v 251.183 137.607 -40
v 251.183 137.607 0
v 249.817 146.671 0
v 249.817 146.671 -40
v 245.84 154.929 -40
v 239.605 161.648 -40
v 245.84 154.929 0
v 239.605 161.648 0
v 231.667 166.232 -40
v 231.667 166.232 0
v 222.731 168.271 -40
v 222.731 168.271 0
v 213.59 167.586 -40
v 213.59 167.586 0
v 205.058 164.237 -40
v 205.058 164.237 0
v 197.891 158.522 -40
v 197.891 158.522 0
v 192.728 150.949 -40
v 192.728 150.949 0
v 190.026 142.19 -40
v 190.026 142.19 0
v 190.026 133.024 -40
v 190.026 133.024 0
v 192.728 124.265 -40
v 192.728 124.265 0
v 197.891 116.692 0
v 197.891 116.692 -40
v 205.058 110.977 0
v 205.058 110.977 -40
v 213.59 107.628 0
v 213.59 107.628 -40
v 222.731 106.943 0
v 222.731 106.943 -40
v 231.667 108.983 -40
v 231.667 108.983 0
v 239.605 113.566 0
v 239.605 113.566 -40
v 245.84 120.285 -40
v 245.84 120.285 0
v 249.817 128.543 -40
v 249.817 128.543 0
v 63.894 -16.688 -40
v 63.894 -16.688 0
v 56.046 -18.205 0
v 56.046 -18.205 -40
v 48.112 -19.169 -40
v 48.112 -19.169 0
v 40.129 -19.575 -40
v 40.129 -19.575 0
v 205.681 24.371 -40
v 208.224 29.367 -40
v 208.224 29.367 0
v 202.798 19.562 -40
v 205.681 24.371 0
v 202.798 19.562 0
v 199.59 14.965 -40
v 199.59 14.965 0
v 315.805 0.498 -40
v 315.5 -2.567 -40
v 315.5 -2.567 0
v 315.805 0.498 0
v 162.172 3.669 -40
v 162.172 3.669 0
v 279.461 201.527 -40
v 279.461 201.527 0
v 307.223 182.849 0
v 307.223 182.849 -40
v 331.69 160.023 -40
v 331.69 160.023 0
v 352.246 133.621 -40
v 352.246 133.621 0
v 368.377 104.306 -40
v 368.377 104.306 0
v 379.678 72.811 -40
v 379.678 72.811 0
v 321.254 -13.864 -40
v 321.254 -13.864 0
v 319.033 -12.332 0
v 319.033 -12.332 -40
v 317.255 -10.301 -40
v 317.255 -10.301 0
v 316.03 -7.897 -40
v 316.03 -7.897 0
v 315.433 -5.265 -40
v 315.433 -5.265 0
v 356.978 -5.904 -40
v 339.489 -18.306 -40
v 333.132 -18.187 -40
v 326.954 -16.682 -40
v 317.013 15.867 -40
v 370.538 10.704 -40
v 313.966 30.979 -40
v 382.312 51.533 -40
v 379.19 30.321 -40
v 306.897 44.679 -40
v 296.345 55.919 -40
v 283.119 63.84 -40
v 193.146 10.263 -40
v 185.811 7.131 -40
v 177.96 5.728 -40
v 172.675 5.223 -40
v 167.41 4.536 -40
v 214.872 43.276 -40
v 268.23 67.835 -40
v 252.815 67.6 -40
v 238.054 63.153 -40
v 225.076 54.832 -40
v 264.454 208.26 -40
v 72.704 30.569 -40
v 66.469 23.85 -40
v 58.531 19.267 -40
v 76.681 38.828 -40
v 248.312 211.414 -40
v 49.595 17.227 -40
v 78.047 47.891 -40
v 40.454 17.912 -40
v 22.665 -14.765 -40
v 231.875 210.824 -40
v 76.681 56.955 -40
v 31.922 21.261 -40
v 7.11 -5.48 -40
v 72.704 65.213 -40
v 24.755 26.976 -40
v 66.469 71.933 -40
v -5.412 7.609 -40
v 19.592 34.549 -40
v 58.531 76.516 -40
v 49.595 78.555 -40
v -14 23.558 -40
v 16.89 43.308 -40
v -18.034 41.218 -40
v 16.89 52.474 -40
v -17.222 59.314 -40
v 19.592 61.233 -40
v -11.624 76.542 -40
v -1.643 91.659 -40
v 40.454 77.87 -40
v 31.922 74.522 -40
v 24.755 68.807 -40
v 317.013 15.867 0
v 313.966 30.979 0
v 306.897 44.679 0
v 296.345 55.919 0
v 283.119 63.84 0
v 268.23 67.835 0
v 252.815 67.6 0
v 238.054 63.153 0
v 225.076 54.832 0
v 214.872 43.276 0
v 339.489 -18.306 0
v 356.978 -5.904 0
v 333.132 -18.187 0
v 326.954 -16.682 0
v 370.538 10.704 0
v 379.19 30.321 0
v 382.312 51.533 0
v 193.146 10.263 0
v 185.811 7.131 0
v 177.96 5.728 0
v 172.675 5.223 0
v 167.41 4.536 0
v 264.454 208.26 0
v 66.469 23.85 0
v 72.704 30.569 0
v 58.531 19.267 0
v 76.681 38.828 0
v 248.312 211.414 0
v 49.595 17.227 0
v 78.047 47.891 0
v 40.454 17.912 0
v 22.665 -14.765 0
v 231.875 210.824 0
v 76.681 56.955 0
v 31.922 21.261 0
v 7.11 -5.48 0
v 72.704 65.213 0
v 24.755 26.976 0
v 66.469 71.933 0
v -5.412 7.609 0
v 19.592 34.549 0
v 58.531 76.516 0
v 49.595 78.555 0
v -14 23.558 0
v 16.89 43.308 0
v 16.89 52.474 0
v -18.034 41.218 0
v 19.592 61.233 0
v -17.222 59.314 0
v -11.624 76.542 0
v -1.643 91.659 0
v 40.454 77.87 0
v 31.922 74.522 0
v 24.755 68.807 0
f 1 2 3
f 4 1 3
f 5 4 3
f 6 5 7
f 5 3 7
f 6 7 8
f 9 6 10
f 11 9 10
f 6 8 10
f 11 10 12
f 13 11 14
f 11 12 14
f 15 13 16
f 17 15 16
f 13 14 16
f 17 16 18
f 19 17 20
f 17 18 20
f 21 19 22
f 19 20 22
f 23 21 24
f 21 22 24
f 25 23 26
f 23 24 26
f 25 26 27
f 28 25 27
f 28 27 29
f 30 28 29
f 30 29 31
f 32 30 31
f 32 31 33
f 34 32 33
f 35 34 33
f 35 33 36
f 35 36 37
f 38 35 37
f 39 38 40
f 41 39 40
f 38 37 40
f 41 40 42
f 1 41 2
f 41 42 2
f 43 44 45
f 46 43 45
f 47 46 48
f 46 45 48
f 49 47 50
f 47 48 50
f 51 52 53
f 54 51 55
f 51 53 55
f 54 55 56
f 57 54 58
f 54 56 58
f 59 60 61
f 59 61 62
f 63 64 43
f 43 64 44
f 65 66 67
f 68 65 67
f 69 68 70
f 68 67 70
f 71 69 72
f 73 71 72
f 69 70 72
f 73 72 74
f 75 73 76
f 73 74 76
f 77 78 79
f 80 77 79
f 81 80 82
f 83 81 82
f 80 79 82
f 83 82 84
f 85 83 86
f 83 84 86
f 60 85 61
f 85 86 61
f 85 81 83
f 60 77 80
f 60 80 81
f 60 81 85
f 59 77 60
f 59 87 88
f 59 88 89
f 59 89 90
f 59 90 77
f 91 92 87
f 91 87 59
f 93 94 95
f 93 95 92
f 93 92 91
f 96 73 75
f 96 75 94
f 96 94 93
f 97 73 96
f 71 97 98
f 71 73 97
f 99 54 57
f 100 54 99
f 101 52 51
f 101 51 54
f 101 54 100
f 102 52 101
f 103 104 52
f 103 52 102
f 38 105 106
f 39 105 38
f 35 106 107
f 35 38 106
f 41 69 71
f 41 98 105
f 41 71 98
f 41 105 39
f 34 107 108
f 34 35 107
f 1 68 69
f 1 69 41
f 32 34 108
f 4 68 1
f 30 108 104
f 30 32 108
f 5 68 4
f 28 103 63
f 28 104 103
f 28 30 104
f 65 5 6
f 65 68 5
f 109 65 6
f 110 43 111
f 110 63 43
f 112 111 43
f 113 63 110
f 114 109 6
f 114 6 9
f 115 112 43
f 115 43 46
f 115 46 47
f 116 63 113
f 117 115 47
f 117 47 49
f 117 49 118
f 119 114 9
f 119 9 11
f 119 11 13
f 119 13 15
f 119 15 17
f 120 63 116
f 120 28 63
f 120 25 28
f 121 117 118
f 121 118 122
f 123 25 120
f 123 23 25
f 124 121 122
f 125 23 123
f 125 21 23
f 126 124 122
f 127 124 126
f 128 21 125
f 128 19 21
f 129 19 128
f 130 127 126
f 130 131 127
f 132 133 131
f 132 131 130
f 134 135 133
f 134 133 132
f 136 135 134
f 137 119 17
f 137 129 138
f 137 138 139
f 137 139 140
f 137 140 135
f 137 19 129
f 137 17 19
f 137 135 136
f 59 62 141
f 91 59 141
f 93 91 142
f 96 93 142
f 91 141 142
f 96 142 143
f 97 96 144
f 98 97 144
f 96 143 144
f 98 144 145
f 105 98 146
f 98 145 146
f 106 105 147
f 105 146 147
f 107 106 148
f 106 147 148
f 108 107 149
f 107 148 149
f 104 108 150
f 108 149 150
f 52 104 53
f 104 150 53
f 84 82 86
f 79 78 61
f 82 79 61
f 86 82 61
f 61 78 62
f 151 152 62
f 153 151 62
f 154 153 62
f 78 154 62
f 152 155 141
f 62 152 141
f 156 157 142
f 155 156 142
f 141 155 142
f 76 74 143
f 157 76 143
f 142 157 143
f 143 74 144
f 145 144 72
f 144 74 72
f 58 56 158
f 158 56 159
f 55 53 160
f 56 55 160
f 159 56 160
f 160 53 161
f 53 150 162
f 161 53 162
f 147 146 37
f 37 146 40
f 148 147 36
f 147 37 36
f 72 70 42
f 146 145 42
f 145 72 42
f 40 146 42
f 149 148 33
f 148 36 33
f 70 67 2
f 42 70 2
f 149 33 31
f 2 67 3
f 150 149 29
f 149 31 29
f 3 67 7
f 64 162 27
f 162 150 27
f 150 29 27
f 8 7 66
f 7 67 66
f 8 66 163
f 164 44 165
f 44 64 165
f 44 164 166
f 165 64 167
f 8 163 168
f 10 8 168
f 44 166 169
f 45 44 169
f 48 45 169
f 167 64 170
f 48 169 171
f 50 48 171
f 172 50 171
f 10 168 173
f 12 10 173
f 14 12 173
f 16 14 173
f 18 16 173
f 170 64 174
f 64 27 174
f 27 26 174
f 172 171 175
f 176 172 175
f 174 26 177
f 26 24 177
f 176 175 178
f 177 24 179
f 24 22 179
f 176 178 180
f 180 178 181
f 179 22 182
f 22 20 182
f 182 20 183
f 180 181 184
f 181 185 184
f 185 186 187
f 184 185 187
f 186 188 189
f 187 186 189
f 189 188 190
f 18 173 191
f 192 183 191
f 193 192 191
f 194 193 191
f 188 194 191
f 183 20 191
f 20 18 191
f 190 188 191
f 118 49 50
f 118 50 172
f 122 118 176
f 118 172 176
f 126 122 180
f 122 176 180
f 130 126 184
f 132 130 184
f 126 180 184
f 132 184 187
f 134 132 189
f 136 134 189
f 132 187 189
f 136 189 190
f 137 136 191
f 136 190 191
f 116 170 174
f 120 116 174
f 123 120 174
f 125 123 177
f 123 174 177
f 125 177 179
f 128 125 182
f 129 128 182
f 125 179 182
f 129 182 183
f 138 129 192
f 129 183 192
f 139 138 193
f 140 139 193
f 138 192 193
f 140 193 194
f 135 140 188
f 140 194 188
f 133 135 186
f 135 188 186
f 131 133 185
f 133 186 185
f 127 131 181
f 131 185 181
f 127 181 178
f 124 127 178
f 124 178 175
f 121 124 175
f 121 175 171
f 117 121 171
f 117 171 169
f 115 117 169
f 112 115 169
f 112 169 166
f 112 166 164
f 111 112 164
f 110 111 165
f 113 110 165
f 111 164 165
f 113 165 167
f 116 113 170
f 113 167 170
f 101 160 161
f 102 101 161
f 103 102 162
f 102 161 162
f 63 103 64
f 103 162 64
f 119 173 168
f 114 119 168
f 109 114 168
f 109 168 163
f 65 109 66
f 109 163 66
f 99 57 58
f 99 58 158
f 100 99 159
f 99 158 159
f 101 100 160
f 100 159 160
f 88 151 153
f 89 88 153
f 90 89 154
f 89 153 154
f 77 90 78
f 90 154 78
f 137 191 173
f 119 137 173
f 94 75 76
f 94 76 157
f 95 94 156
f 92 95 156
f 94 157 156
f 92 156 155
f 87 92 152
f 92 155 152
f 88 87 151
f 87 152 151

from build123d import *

# Parameters (mm, degrees)
IZIM1_R            = 30.75
TABAN_FLAN_1_DEPTH = 40


# Sheet-metal steps are written as plain solids
with BuildPart() as part:
    # Çizim1 → Taban-Flanş1 (new body)
    with BuildSketch(Plane.XY):
        with BuildLine():
            Line((-1.643398768, 91.658785331), (231.87468677, 210.823863864))
            ThreePointArc((231.87468677, 210.823863864), (256.473387586, 210.2990154), (279.460662471, 201.526516265))
            ThreePointArc((279.460662471, 201.526516265), (342.491227066, 147.22978074), (379.677674371, 72.810994814))
            ThreePointArc((379.677674371, 72.810994814), (375.525370831, 20.220941214), (339.489037745, -18.306166907))
            ThreePointArc((339.489037745, -18.306166907), (330.00144074, -17.604735784), (321.25415431, -13.864216747))
            ThreePointArc((321.25415431, -13.864216747), (316.568149269, -9.137053114), (315.500028304, -2.567134022))
            Line((315.500028304, -2.567134022), (315.804951466, 0.498028518))
            ThreePointArc((315.804951466, 0.498028518), (275.813280207, 66.354649224), (208.223919967, 29.366723581))
            ThreePointArc((208.223919967, 29.366723581), (204.280862876, 21.941440766), (199.589645635, 14.964693321))
            ThreePointArc((199.589645635, 14.964693321), (189.567794587, 8.489124316), (177.959719616, 5.728130318))
            ThreePointArc((177.959719616, 5.728130318), (170.039190968, 4.902214912), (162.171757217, 3.669171324))
            Line((162.171757217, 3.669171324), (63.894243865, -16.687773846))
            ThreePointArc((63.894243865, -16.687773846), (52.087429233, -18.756679073), (40.128679606, -19.57493818))
            ThreePointArc((40.128679606, -19.57493818), (-13.999894405, 23.558211566), (-1.643398768, 91.658785331))
        make_face()
        with Locations((47.296813478, 47.891327559)):
            Circle(IZIM1_R, mode=Mode.SUBTRACT)
        with Locations((220.432800905, 137.607155914)):
            Circle(IZIM1_R, mode=Mode.SUBTRACT)
    extrude(amount=-TABAN_FLAN_1_DEPTH)


solid = part.part
